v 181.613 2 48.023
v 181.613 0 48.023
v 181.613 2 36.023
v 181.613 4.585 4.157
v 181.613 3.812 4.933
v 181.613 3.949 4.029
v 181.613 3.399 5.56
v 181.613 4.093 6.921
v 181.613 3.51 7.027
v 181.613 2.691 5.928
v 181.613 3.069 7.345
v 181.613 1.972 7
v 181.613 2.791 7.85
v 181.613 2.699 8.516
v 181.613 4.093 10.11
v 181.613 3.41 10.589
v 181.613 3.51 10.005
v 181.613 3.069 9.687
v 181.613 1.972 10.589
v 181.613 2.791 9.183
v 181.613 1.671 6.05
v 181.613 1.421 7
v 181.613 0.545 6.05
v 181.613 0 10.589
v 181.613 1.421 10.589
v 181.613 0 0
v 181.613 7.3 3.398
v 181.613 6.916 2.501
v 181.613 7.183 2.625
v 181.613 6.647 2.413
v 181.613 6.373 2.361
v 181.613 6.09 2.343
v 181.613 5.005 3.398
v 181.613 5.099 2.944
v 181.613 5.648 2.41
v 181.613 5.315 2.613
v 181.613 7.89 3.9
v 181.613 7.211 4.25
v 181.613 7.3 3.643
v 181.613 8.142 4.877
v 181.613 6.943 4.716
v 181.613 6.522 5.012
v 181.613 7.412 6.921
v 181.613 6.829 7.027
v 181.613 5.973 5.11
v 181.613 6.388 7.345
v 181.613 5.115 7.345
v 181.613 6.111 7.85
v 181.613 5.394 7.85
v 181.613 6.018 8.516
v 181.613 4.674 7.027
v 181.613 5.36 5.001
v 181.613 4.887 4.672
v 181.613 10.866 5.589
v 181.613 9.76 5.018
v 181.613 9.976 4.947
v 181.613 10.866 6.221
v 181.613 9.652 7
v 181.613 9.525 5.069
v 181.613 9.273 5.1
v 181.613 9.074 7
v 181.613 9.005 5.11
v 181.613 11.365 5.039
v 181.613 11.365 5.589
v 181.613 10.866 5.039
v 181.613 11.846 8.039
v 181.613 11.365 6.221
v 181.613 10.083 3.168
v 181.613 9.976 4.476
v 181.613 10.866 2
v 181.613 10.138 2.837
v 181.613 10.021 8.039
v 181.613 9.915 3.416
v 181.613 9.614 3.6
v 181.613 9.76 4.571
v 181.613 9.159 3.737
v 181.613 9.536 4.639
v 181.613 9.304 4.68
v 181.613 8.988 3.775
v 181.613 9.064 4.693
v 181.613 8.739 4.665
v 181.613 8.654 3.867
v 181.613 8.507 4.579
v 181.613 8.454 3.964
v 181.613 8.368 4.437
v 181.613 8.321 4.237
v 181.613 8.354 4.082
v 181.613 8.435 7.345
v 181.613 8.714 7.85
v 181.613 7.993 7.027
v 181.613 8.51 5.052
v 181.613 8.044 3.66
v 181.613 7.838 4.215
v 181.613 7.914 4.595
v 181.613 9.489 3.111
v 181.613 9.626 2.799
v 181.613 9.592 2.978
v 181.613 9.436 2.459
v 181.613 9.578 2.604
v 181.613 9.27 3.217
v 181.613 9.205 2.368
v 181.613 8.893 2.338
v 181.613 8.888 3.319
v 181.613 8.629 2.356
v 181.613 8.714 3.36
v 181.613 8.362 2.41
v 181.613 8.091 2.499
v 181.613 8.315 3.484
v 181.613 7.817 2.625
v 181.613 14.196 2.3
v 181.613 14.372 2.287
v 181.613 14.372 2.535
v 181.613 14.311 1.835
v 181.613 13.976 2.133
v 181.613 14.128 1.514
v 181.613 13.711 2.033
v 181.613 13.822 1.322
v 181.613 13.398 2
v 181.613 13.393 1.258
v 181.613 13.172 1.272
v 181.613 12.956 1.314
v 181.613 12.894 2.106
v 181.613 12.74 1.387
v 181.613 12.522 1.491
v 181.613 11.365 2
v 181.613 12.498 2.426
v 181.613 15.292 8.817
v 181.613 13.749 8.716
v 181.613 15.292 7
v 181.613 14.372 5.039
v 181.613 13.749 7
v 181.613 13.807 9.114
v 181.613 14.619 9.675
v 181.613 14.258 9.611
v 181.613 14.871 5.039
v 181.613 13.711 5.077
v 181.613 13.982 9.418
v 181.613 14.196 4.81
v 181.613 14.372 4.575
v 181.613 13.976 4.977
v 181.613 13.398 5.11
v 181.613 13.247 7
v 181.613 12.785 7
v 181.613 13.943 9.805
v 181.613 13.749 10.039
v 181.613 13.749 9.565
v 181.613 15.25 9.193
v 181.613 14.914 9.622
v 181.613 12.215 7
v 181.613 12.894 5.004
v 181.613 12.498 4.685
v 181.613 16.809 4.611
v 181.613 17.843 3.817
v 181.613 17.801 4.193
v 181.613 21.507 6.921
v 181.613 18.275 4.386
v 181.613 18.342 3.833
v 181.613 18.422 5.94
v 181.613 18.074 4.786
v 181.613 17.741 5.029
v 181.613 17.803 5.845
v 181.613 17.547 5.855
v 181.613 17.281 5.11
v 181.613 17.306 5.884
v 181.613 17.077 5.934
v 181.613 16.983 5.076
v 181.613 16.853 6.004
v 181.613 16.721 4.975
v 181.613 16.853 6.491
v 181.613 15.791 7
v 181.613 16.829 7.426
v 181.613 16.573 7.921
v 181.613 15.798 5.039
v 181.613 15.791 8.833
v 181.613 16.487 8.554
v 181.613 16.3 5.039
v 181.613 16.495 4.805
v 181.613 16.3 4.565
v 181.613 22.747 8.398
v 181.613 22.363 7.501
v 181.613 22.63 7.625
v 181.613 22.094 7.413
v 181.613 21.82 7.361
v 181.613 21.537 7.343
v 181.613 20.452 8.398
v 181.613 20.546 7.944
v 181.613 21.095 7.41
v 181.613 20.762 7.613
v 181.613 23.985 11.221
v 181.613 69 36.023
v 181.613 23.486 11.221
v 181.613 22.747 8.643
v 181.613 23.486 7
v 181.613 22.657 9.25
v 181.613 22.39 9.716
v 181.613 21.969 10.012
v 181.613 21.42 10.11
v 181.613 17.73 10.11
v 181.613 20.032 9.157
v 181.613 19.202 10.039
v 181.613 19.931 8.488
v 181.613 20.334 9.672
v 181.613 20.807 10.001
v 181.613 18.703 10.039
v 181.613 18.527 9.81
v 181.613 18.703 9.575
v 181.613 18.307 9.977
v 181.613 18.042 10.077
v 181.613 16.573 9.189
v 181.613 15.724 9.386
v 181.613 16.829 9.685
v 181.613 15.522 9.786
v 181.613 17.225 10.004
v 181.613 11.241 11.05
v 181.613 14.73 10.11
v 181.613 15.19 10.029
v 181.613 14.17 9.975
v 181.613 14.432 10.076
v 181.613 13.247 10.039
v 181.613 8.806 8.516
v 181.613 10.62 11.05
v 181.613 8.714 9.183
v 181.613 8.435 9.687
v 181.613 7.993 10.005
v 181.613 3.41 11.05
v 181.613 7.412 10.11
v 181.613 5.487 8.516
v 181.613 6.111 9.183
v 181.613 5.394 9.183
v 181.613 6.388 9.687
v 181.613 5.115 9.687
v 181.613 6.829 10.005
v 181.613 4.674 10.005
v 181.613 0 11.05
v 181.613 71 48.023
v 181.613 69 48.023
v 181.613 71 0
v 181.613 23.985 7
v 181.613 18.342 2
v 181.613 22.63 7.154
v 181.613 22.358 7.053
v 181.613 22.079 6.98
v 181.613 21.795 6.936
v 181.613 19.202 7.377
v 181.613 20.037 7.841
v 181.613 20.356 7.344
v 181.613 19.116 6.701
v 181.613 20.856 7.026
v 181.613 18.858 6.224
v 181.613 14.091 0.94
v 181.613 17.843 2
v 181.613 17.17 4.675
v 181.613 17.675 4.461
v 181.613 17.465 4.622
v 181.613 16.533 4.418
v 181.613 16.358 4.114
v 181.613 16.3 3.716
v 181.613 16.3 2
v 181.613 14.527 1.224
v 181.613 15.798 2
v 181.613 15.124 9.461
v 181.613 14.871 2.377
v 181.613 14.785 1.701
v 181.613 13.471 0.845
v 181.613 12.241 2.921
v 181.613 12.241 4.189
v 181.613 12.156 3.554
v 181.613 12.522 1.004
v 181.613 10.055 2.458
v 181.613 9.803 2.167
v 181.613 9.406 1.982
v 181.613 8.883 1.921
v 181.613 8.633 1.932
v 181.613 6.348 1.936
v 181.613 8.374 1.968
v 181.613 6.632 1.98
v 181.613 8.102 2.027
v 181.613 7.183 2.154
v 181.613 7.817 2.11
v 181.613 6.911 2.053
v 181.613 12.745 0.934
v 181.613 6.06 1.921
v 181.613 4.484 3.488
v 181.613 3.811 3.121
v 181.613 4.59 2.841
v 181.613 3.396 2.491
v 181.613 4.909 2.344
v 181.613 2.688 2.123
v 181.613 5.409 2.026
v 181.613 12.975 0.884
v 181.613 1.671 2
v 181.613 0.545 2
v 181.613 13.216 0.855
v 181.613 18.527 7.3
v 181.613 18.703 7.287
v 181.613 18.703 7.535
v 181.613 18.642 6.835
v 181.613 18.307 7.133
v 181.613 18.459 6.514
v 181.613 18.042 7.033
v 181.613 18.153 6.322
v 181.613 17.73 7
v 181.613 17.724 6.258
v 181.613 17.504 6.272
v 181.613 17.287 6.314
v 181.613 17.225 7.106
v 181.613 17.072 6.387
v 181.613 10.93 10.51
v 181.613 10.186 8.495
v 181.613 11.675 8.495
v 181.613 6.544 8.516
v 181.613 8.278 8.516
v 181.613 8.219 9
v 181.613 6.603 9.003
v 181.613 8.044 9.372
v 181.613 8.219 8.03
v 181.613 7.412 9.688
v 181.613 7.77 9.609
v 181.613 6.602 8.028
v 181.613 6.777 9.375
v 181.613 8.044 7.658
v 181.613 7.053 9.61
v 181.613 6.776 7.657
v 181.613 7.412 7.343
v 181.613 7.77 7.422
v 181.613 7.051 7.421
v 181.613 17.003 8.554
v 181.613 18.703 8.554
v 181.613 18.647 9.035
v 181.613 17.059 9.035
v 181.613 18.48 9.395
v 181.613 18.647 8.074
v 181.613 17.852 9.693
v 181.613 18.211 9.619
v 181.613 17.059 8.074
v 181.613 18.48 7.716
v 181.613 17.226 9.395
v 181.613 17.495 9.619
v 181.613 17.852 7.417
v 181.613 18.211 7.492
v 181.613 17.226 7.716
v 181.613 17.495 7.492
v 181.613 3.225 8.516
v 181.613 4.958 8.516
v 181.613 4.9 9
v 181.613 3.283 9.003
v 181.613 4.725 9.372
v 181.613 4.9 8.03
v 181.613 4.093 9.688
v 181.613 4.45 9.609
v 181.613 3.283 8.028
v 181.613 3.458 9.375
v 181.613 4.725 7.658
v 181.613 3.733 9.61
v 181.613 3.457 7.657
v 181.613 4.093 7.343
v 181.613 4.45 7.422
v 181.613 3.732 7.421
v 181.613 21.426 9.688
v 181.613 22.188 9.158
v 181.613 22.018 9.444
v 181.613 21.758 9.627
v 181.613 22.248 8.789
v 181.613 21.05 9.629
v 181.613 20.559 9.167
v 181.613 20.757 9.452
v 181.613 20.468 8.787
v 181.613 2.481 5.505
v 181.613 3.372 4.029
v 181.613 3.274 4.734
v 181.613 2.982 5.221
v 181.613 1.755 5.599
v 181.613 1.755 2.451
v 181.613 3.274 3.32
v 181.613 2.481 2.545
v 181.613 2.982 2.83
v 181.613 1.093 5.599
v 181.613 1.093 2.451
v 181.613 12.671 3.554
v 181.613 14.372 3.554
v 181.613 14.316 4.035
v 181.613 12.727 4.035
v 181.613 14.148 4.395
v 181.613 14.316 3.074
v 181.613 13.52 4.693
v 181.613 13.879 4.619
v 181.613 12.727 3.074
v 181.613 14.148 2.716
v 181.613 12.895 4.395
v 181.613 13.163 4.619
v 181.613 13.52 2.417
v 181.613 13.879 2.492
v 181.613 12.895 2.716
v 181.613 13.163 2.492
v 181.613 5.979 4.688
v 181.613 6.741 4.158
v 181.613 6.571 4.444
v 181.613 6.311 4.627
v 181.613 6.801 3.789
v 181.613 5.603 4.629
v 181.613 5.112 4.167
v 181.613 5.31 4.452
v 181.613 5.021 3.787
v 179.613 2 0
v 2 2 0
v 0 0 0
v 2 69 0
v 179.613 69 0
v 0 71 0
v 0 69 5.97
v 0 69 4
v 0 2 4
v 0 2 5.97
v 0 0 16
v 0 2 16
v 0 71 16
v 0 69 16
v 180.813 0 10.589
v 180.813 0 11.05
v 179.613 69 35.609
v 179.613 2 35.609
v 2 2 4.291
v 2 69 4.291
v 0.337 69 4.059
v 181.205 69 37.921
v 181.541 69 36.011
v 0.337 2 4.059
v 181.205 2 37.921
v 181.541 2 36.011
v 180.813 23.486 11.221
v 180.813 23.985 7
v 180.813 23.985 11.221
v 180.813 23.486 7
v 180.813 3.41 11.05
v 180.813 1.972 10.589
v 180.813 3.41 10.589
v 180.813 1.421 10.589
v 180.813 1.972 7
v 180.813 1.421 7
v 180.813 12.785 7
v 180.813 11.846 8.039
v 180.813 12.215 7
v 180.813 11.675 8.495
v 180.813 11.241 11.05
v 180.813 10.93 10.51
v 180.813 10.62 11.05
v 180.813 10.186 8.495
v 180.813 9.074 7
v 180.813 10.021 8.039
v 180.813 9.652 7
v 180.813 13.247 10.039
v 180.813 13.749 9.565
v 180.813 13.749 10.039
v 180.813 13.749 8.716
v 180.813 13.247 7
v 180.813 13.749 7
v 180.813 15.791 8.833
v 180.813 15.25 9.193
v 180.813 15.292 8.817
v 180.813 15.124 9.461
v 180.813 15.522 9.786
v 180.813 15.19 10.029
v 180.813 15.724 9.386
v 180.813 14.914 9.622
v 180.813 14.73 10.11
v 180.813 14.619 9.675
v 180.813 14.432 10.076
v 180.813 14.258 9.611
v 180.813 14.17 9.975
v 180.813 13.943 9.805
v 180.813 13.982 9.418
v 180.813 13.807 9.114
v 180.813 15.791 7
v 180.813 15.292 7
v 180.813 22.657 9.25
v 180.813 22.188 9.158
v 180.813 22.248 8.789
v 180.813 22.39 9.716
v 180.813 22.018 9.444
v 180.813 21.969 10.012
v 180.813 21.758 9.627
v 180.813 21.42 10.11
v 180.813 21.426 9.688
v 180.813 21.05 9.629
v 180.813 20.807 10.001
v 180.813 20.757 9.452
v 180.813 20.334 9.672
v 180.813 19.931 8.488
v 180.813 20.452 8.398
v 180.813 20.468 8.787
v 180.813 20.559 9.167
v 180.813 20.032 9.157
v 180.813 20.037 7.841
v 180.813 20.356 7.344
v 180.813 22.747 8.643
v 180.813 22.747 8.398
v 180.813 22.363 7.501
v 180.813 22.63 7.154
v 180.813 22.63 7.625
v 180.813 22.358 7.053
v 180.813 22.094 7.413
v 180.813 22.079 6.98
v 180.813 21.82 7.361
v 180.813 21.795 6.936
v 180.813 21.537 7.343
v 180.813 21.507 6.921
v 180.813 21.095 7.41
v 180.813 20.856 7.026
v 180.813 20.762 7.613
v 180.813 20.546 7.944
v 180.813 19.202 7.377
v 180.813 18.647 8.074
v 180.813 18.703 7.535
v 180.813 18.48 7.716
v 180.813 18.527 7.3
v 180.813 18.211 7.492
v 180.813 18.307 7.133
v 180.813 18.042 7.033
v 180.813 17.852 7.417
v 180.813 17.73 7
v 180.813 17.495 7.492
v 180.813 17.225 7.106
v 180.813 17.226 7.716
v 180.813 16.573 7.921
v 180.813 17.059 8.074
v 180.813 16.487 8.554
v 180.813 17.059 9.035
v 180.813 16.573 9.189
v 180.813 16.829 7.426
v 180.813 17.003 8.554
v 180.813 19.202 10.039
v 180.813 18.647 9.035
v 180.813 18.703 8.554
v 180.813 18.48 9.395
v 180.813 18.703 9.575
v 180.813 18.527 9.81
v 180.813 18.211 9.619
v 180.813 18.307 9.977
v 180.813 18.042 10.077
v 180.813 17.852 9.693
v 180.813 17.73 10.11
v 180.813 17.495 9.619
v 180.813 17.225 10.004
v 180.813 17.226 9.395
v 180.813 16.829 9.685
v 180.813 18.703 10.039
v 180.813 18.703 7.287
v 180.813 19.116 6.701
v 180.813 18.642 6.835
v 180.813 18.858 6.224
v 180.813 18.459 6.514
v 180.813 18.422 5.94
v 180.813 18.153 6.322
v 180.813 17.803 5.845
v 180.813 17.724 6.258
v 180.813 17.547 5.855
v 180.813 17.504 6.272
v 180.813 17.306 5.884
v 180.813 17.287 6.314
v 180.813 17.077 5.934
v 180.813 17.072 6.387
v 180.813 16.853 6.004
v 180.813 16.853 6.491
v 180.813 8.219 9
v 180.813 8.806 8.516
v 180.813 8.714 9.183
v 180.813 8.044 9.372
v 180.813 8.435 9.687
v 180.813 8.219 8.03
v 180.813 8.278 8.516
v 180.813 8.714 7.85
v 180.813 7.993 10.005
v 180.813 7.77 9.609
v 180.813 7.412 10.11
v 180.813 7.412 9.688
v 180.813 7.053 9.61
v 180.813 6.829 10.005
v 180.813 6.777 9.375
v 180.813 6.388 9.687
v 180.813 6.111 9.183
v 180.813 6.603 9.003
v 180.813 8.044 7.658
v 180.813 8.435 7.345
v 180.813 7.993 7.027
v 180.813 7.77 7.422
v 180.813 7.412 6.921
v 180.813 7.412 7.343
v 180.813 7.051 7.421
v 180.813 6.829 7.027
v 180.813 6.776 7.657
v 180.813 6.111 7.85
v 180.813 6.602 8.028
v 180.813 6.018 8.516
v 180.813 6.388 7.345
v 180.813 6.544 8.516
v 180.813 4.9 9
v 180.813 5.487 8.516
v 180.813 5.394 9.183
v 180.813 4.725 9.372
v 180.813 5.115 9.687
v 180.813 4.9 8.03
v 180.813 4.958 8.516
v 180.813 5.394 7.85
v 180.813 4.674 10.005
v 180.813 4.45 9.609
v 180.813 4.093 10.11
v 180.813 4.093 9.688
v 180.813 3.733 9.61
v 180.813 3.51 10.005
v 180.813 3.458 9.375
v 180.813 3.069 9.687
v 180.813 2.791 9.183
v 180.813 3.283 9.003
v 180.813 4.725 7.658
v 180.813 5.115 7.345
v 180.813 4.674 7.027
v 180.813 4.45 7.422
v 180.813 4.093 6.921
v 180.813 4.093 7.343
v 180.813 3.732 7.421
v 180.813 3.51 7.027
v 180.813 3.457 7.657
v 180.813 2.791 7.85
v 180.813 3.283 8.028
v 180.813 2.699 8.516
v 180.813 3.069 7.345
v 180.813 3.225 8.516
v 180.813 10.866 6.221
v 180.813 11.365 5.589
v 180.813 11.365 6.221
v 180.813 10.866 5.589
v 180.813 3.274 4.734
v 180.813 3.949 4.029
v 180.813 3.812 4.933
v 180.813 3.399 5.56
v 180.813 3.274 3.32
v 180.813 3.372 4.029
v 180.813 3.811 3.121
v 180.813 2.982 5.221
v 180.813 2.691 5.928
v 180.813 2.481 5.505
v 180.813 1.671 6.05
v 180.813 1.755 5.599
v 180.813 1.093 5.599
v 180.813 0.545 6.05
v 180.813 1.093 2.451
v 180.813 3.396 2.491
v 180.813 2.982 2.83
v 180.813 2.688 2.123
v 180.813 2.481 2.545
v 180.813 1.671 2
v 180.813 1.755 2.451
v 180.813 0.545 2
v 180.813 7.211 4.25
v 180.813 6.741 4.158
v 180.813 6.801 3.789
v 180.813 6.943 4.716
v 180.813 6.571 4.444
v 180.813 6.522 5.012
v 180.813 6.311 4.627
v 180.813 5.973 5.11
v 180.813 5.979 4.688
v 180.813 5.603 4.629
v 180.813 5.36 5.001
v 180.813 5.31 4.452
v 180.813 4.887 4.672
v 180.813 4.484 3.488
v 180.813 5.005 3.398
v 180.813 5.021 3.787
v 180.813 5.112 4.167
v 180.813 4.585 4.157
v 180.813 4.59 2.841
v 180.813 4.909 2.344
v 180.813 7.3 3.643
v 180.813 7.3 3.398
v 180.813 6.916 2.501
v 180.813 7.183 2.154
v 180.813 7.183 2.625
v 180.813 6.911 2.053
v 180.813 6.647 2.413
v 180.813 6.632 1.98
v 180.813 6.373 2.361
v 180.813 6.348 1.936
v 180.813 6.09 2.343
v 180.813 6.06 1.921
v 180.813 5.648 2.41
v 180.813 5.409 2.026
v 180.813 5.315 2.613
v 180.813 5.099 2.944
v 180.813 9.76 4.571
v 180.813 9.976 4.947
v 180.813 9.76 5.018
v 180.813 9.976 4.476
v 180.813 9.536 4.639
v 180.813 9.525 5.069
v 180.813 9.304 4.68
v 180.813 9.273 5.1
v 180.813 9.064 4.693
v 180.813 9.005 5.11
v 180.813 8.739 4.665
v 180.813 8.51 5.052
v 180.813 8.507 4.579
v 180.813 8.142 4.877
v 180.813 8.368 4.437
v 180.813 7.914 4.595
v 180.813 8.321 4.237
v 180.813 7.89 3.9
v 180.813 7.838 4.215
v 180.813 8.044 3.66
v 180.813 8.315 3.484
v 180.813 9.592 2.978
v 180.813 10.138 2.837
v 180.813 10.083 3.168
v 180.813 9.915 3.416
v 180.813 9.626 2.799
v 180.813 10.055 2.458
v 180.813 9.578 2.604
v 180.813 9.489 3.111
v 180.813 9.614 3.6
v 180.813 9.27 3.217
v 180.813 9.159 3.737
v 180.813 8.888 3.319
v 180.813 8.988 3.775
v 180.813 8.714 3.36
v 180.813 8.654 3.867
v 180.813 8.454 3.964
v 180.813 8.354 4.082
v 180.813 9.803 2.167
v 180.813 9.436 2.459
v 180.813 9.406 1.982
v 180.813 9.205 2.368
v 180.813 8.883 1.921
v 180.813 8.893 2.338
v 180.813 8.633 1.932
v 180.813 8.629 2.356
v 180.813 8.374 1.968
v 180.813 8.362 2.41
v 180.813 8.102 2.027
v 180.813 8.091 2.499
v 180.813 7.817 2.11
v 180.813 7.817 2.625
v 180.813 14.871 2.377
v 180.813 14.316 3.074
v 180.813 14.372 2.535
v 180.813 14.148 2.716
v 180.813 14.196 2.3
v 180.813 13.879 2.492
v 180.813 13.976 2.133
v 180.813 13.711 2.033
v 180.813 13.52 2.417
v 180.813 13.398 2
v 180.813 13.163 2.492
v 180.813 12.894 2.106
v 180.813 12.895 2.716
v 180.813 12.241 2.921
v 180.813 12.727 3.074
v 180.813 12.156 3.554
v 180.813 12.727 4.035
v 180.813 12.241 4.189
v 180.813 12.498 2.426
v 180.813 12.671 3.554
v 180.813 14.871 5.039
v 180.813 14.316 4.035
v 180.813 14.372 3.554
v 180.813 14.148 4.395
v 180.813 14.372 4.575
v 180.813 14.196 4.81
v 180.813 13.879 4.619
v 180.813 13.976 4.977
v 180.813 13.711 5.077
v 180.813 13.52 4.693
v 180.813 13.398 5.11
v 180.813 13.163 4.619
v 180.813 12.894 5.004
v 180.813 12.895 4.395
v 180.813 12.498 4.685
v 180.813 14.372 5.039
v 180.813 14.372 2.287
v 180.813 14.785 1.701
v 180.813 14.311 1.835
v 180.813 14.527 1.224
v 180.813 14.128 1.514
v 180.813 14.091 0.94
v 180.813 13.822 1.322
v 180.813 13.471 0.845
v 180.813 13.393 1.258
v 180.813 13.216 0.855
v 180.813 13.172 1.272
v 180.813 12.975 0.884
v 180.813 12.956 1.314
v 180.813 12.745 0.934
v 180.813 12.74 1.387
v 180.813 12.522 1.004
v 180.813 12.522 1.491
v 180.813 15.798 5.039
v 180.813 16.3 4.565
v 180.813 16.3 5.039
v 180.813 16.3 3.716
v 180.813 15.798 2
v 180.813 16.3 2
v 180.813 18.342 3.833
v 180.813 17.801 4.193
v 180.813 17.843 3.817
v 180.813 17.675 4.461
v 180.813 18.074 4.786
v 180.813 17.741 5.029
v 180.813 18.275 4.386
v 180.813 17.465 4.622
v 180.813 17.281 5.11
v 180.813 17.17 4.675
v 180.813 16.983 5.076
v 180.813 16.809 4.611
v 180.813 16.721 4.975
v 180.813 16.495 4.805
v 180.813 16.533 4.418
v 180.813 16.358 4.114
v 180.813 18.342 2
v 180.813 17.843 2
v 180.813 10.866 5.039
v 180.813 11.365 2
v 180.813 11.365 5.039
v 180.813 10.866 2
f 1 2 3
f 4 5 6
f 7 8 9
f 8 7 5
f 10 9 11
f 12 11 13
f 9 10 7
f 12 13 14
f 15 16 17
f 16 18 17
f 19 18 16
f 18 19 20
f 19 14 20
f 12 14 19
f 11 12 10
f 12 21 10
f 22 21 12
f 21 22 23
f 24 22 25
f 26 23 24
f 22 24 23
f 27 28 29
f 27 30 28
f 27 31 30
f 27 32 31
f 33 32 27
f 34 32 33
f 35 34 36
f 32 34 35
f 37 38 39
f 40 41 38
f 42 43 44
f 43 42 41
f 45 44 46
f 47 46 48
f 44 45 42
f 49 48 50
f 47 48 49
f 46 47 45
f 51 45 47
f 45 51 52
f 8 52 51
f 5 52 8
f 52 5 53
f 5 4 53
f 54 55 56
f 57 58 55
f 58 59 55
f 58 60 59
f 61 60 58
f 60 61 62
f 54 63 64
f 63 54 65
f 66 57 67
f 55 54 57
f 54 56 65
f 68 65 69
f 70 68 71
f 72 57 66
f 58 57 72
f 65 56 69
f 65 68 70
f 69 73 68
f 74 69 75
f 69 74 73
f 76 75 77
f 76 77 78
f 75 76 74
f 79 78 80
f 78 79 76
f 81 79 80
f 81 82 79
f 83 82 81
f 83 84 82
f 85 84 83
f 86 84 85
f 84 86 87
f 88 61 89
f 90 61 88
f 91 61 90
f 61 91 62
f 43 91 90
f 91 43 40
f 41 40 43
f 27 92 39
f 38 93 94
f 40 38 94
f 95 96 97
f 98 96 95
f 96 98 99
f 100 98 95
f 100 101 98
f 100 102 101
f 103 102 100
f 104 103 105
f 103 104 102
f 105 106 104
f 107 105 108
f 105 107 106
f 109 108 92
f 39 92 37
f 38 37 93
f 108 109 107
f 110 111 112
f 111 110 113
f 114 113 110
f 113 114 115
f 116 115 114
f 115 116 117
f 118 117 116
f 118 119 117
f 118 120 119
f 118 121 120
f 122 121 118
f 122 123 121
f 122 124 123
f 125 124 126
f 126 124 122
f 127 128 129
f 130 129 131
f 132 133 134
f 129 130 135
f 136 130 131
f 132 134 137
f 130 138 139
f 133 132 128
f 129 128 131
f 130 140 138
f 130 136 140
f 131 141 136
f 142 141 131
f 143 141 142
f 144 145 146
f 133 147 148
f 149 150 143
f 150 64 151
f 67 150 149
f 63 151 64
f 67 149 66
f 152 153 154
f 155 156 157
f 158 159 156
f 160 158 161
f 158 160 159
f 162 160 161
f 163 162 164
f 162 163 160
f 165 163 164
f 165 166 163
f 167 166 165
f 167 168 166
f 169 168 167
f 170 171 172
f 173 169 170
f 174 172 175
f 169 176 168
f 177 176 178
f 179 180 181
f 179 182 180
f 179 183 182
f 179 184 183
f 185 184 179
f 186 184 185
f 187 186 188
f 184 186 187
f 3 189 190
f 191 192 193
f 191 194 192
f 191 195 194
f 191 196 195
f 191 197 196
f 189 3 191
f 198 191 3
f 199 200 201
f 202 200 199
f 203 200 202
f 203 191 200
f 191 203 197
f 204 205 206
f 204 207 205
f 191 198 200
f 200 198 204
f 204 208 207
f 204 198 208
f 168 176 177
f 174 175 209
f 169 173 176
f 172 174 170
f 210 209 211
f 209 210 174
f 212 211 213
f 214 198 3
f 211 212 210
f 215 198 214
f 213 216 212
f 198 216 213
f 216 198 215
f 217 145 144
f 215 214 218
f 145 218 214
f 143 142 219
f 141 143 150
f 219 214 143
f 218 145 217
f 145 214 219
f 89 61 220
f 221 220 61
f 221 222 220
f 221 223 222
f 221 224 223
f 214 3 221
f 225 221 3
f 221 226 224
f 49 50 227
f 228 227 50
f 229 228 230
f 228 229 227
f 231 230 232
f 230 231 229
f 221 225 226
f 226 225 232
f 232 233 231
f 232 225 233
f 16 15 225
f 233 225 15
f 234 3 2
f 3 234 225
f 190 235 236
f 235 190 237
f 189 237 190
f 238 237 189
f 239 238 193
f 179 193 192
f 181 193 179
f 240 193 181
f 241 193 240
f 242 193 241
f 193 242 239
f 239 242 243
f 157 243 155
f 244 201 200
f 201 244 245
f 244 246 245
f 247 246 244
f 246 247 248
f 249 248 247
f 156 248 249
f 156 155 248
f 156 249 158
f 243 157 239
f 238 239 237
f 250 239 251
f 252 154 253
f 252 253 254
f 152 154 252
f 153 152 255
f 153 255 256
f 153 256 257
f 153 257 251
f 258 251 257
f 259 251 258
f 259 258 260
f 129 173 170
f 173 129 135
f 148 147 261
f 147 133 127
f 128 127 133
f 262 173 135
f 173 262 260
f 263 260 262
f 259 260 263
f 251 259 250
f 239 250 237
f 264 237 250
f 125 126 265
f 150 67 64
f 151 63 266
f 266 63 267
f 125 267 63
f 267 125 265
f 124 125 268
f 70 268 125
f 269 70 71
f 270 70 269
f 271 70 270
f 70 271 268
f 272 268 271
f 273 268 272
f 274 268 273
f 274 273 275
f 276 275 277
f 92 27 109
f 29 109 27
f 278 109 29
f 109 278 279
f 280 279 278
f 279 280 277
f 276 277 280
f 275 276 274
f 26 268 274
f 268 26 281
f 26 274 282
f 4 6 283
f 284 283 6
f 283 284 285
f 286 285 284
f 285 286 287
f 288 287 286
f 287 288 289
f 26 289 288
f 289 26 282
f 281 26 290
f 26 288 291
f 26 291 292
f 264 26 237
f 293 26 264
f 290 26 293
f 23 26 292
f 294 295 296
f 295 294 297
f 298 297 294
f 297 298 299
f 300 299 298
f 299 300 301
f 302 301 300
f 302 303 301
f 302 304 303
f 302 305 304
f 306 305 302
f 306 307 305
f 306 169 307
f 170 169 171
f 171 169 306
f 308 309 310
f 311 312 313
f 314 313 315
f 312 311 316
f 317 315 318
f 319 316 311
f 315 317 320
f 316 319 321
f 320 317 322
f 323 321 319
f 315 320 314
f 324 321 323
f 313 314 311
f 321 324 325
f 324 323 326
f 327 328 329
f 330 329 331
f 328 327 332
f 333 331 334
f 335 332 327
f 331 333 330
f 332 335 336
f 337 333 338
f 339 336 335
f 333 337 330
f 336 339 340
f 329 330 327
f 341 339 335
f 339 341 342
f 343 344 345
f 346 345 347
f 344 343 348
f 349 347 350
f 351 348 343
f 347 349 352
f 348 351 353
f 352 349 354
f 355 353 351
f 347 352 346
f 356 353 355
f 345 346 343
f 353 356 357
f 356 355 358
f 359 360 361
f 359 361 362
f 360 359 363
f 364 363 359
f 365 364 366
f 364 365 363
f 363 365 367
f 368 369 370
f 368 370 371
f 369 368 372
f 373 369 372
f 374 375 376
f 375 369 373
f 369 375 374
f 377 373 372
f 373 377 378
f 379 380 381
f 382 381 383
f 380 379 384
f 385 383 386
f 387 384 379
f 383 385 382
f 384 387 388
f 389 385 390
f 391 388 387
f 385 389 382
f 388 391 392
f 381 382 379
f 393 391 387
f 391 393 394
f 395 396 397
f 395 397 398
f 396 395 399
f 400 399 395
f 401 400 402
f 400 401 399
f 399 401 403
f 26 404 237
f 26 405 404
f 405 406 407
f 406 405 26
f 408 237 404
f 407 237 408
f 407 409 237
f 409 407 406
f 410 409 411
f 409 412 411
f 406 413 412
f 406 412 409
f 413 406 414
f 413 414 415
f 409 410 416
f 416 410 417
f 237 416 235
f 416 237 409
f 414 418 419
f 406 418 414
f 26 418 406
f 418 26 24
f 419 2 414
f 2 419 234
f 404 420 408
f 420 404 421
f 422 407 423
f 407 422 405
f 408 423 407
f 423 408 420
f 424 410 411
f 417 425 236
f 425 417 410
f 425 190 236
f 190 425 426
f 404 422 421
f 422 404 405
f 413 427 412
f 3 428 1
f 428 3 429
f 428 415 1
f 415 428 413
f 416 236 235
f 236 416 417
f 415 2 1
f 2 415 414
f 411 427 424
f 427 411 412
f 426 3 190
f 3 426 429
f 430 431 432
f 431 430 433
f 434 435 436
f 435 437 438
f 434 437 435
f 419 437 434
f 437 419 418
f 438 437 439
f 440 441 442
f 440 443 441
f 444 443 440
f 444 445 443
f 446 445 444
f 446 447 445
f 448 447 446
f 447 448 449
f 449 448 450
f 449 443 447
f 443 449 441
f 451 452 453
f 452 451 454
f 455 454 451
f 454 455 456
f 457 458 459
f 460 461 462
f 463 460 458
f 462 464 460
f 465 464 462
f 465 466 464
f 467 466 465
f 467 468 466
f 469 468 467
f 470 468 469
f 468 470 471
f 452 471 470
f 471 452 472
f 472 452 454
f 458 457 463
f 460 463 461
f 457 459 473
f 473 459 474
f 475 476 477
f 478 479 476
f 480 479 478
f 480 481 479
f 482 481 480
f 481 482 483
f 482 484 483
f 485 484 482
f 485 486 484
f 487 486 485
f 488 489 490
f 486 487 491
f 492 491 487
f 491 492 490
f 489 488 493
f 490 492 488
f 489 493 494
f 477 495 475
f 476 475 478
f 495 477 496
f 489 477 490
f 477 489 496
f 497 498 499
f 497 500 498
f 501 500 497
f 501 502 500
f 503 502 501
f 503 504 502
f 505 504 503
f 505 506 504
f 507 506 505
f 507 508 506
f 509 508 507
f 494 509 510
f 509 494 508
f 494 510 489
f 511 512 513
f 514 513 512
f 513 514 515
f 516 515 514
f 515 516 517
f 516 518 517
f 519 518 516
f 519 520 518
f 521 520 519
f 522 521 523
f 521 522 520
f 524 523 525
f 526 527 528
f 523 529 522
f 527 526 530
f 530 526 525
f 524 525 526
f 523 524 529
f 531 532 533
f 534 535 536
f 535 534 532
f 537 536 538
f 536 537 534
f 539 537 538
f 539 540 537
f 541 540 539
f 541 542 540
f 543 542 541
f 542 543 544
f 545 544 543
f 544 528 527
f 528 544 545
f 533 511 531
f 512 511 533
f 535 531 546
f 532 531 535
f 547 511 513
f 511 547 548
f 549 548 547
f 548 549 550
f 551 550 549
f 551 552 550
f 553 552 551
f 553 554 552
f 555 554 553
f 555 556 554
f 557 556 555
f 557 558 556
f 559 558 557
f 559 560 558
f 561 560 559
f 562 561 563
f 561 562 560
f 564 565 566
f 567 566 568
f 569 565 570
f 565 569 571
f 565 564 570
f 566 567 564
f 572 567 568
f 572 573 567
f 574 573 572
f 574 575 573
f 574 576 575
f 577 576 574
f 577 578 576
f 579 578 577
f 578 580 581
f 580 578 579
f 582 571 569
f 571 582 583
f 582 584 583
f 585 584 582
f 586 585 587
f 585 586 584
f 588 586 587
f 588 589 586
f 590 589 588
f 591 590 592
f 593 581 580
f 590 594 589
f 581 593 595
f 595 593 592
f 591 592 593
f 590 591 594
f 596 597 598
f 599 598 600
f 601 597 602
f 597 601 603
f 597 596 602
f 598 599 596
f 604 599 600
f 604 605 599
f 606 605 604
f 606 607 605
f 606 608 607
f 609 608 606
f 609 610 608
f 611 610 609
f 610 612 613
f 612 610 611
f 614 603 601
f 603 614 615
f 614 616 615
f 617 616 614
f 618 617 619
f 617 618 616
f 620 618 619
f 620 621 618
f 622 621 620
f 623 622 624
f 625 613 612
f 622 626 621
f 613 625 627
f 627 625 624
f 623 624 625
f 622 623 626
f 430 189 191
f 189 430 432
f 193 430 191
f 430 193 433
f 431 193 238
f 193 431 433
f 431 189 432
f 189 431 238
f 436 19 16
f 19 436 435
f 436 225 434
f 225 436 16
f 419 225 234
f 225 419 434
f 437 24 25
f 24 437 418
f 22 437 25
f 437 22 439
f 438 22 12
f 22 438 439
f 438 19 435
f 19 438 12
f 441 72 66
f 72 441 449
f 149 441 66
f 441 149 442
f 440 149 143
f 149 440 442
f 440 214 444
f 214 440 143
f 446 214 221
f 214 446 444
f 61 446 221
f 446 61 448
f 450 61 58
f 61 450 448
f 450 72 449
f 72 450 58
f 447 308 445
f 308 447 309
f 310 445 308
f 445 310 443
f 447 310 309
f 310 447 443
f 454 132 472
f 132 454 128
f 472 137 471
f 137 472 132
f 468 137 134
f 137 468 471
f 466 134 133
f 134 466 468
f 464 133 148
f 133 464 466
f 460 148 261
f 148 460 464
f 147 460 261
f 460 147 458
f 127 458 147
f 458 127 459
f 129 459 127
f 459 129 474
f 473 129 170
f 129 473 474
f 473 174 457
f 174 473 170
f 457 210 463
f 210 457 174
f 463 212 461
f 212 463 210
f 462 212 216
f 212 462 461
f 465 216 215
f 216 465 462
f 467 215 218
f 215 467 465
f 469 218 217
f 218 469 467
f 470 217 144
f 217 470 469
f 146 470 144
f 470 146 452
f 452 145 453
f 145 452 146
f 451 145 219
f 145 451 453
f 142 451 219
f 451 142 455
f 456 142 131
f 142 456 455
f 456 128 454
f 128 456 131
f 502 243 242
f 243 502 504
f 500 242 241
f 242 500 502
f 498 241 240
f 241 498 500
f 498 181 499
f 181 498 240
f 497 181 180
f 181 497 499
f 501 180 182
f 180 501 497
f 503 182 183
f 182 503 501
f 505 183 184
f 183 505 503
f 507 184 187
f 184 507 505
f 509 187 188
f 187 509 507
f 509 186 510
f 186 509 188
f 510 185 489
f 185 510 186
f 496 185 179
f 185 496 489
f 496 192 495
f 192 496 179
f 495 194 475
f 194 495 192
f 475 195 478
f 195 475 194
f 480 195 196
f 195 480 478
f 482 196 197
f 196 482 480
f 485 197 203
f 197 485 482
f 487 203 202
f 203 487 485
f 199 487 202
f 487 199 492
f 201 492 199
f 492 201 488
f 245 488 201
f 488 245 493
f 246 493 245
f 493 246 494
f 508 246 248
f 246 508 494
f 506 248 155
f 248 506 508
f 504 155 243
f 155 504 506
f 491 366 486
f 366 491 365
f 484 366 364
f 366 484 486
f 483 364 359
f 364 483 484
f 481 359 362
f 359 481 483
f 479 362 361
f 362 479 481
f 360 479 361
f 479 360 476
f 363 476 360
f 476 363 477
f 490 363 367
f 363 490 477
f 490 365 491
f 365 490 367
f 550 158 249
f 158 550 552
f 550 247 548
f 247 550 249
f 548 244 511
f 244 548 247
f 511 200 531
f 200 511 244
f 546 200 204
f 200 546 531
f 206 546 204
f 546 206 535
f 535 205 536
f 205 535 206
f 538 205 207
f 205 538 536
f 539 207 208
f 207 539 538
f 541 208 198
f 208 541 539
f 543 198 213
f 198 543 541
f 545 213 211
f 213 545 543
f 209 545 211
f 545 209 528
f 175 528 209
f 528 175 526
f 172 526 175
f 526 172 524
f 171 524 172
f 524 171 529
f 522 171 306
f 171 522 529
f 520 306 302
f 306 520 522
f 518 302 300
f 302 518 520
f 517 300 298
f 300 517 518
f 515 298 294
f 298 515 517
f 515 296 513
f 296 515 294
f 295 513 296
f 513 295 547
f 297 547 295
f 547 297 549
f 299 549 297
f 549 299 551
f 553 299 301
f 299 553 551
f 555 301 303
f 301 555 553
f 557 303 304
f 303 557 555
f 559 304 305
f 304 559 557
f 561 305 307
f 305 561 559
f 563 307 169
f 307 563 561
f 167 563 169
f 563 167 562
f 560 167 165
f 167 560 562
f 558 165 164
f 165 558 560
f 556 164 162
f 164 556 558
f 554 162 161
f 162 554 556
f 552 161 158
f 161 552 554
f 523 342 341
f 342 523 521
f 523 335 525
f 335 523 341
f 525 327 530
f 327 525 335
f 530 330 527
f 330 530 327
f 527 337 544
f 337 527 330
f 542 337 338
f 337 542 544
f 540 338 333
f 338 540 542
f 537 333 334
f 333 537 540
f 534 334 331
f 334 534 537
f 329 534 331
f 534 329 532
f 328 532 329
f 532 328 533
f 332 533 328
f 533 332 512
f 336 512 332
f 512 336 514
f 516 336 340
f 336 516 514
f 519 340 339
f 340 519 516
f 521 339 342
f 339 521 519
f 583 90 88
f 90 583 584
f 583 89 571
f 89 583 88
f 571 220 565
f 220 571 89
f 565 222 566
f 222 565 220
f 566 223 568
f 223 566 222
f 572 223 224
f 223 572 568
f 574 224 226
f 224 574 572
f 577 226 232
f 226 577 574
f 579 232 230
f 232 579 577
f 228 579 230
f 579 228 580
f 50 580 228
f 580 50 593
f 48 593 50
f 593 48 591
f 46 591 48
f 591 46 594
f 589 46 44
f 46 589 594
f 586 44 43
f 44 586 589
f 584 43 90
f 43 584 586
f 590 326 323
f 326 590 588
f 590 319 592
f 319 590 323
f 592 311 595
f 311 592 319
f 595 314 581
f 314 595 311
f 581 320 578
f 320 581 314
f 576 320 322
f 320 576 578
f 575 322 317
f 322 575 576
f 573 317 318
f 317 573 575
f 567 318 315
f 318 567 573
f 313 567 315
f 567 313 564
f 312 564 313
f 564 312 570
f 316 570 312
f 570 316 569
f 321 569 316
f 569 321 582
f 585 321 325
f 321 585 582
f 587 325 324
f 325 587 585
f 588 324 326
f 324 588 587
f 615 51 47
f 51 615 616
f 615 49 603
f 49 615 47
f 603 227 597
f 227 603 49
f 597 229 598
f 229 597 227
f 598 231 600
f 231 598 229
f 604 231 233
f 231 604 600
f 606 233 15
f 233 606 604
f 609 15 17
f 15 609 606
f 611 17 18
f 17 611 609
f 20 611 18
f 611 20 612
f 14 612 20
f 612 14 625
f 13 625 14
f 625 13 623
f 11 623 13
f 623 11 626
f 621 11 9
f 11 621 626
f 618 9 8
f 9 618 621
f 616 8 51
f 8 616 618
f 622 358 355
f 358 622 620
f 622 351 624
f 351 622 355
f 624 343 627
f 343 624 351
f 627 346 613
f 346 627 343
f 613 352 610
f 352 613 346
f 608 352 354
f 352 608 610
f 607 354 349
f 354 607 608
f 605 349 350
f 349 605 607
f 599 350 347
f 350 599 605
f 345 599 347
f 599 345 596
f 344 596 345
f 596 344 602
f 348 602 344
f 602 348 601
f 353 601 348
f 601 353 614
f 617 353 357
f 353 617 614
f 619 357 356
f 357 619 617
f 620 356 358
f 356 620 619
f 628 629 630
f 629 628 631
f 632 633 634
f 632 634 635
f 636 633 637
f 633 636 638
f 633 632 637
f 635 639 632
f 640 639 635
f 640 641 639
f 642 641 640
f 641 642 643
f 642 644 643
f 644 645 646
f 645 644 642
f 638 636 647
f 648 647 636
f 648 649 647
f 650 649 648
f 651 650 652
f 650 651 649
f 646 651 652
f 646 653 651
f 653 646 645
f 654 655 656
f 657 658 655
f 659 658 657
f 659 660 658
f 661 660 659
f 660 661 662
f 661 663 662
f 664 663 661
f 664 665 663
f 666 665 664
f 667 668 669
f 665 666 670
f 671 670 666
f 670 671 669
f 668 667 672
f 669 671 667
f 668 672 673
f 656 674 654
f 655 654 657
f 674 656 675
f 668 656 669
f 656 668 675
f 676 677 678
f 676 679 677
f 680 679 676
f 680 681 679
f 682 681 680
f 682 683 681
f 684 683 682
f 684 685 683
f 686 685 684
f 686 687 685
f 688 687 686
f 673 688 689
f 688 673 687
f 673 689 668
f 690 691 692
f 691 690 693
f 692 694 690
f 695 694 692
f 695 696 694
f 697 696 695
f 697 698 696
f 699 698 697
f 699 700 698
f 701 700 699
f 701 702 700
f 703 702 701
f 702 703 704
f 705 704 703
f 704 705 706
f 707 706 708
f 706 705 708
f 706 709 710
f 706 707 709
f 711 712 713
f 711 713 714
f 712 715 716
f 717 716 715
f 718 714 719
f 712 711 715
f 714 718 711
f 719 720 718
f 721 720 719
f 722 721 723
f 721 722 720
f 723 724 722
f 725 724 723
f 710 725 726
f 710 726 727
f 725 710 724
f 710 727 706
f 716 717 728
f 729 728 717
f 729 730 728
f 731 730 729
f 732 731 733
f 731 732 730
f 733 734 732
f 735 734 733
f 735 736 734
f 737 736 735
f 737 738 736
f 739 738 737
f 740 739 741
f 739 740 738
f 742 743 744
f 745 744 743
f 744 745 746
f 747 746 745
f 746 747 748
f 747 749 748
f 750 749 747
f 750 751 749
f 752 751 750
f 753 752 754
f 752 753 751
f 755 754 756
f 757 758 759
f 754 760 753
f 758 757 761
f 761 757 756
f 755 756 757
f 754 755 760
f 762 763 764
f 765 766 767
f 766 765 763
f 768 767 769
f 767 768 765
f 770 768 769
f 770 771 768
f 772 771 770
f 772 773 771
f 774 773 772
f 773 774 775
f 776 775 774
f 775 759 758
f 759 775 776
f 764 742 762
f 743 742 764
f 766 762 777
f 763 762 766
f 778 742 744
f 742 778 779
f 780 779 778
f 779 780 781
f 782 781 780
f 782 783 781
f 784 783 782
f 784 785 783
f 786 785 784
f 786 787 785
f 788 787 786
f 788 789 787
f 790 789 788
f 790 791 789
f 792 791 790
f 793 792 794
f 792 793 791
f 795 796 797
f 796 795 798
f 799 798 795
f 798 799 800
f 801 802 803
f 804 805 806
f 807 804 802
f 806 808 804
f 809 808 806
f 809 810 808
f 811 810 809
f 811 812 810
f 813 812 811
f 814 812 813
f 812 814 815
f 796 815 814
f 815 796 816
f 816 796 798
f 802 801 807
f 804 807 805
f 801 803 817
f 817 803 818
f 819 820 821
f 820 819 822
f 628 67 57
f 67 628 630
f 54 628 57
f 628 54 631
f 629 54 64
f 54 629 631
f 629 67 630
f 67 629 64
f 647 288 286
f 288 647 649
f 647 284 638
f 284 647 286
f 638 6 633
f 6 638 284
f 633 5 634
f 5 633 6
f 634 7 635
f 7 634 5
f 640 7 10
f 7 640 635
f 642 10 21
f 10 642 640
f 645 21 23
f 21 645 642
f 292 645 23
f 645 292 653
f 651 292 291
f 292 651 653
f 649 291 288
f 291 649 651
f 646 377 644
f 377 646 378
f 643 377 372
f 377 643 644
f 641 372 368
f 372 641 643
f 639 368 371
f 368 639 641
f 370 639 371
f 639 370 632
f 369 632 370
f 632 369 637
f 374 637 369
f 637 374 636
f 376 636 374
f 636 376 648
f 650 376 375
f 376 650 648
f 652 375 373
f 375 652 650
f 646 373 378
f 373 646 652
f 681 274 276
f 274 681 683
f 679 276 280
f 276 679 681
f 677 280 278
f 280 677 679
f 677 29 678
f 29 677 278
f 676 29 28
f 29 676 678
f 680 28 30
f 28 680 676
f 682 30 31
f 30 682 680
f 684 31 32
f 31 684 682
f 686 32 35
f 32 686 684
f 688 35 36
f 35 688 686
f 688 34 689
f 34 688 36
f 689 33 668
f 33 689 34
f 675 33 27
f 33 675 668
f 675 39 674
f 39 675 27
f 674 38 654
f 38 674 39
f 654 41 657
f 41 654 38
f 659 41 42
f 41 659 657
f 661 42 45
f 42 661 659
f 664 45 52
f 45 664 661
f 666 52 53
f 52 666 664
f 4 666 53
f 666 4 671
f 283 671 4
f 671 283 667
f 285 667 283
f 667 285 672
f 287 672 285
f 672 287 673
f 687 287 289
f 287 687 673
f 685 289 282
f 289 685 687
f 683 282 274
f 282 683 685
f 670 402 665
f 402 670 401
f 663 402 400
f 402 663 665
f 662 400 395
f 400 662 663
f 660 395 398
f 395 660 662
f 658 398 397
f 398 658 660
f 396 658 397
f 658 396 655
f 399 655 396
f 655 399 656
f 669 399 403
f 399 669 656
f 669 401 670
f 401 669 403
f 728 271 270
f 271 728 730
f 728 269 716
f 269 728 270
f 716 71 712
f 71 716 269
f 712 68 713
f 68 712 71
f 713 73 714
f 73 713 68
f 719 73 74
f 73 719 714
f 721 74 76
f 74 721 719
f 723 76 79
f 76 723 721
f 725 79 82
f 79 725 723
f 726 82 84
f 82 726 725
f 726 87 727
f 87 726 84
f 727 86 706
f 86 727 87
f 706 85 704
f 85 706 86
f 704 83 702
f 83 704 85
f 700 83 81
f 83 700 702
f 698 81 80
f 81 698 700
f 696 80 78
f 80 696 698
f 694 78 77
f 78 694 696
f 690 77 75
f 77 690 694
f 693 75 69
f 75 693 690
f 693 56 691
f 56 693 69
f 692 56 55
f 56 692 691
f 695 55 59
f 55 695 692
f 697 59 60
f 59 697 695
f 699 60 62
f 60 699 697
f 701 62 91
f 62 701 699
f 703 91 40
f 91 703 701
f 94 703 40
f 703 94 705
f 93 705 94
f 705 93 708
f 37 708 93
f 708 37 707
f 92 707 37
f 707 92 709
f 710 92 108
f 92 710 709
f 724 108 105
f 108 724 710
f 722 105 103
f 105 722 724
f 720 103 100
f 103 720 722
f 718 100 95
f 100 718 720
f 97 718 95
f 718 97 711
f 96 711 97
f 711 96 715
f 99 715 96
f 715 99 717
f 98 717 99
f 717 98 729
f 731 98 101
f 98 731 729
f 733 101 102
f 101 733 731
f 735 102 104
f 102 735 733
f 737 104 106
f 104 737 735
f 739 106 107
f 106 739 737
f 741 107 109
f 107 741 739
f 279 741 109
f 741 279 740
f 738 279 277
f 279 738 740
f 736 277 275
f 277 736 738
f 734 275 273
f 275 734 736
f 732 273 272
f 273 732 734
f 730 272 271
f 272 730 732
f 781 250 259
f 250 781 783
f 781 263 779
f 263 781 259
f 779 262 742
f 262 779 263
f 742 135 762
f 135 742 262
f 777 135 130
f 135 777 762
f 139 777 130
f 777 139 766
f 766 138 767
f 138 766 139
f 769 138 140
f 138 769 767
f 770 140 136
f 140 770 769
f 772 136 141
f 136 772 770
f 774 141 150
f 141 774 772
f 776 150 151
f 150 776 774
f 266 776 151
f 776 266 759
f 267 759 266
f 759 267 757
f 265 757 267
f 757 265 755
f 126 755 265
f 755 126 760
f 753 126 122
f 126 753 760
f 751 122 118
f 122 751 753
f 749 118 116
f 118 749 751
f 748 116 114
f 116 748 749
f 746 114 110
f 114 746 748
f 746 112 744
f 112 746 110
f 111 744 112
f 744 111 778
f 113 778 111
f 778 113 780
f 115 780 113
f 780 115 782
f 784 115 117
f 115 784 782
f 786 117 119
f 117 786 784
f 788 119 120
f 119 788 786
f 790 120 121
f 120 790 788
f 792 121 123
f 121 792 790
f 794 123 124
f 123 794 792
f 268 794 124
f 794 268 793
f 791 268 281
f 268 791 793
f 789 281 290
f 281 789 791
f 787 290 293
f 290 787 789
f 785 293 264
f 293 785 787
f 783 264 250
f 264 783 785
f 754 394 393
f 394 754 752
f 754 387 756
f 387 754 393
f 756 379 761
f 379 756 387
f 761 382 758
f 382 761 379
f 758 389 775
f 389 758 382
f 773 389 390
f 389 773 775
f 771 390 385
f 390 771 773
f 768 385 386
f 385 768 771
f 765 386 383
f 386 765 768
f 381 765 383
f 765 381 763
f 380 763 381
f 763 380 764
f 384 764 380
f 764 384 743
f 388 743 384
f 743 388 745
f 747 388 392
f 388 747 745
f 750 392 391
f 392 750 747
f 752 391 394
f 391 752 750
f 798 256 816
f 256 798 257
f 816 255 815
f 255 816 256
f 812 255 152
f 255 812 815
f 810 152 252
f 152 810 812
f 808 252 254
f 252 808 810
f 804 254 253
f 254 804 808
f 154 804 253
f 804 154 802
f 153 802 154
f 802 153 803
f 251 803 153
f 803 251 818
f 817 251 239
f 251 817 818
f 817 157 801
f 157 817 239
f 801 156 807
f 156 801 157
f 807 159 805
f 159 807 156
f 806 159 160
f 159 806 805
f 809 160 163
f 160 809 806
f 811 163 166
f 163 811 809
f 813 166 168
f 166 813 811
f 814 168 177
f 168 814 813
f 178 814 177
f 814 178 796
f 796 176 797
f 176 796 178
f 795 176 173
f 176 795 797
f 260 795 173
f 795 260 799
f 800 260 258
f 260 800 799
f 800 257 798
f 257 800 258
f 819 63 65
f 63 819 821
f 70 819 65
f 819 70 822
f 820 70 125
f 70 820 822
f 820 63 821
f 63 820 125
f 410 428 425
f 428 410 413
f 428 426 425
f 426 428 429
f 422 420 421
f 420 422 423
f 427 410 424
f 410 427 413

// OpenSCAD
accus = 10;
gradient = 10;
accu_diameter = 18; 
accu_length = 67; // 65 plus padding
thickness = 2;


length = accus * accu_diameter;

// Height
// sin alpha = opposite / hypothenuse
// height = length * sin gradient
height = length * sin(gradient);
echo("Height: ", height);

// Base offset
// Due to different ankle
// sin alpha = opposite / hypothenuse
// base_offset = thickness * sin gradient
base_offset = thickness * sin(gradient);
echo("Base offset: ", base_offset);

// Case length
// cos alpha = adjacent / hypothenuse
// case_length = length * cos gradient
case_length = length * cos(gradient) + base_offset;
echo("Case length: ", case_length);

// Grip offset
// sin alpha = opposite / hypothenuse
// grip_offset = accu_diameter / 2 * sin gradient
grip_offset = accu_diameter / 2 * sin(gradient);
echo("Grip offset: ", grip_offset);

back_height = sin(gradient) * (length + 2 * thickness);

difference() {
    cube([case_length + 2 * thickness, accu_length + 2 * thickness, height + accu_diameter + 2 * thickness]);
    translate([thickness, thickness, 0]) cube([case_length, accu_length, height + accu_diameter + 2 * thickness]);
    translate([0, 0, accu_diameter / 1.5 + 2 * thickness]) rotate([0, -gradient, 0]) cube([length + 2 * thickness + 10, accu_length + 2 * thickness, height + 10]);

    translate([0, thickness, 2 * thickness]) rotate([0, -gradient, 0]) cube([case_length + 10 * thickness, accu_length, accu_diameter]);    
    
    translate([case_length + 1.6 * thickness, 0, 7]) rotate([90, 0, 90]) linear_extrude(thickness / 2) text("TooAngel", size=4, font="Deftone Stylus:style=Regular");
    translate([case_length + 1.6 * thickness, 0, 2]) rotate([90, 0, 90]) linear_extrude(thickness / 2) text("Design", size=4, font="Deftone Stylus:style=Regular");
}

translate([base_offset, 0, 2 * thickness]) rotate([0, -gradient, 0]) cube([length + 2 * thickness, accu_length + 2 * thickness, thickness]);
